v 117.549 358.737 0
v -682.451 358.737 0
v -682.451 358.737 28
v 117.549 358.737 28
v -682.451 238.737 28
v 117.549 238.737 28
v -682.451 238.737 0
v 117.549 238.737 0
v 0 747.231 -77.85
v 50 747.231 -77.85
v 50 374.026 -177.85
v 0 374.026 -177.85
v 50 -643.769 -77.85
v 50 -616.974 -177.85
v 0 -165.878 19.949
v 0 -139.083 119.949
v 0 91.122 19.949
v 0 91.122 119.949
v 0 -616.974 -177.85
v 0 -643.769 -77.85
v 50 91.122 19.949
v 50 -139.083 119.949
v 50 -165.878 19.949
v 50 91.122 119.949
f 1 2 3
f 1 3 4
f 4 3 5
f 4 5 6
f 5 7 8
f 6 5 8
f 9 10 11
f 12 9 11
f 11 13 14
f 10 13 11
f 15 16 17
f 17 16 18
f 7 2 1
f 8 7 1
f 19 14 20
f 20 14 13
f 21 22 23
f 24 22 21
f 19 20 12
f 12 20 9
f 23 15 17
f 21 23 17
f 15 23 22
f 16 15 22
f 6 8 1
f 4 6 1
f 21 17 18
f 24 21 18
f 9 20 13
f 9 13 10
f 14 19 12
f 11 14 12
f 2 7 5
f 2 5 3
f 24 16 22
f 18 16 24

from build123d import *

# Parameters (mm, degrees)
F0_W      = 1391
F0_H      = 100
F1_DEPTH  = 50
F3_DEPTH  = 50.001
F5_DEPTH  = 50.001
F6_W      = 257
F6_H      = 100
F7_DEPTH  = 50
F9_DEPTH  = 50.001
F10_W     = 800
F10_H     = 120
F11_DEPTH = 28


with BuildPart() as f1:
    # F0 (on Right) → F1 (new body)
    with BuildSketch(Plane.YZ):
        with Locations((51.731261, -127.84968)):
            Rectangle(F0_W, F0_H)
    extrude(amount=F1_DEPTH)

    # F2 (on face) → F3 (cut, through all)
    with BuildSketch(Plane.YZ.offset(50)):
        Polygon((-616.97382, -177.84968), (-643.768739, -77.84968), (-643.768739, -177.84968), align=None)
    extrude(amount=-F3_DEPTH, mode=Mode.SUBTRACT)

    # F4 (on face) → F5 (cut, through all)
    with BuildSketch(Plane.YZ.offset(50)):
        Polygon((747.231261, -177.84968), (747.231261, -77.84968), (374.02618, -177.84968), align=None)
    extrude(amount=-F5_DEPTH, mode=Mode.SUBTRACT)


with BuildPart() as f7:
    # F6 (on Right) → F7 (new body)
    with BuildSketch(Plane.YZ):
        with Locations((-37.378192, 69.948979)):
            Rectangle(F6_W, F6_H)
    extrude(amount=F7_DEPTH)

    # F8 (on face) → F9 (cut, through all)
    with BuildSketch(Plane.YZ.offset(50)):
        Polygon((-165.878192, 119.948979), (-165.878192, 19.948979), (-139.083273, 119.948979), align=None)
    extrude(amount=-F9_DEPTH, mode=Mode.SUBTRACT)


with BuildPart() as f11:
    # F10 (on Top) → F11 (new body)
    with BuildSketch(Plane.XY):
        with Locations((-282.45095, 298.736954)):
            Rectangle(F10_W, F10_H)
    extrude(amount=F11_DEPTH)


solid = Compound([f1.part, f7.part, f11.part])
